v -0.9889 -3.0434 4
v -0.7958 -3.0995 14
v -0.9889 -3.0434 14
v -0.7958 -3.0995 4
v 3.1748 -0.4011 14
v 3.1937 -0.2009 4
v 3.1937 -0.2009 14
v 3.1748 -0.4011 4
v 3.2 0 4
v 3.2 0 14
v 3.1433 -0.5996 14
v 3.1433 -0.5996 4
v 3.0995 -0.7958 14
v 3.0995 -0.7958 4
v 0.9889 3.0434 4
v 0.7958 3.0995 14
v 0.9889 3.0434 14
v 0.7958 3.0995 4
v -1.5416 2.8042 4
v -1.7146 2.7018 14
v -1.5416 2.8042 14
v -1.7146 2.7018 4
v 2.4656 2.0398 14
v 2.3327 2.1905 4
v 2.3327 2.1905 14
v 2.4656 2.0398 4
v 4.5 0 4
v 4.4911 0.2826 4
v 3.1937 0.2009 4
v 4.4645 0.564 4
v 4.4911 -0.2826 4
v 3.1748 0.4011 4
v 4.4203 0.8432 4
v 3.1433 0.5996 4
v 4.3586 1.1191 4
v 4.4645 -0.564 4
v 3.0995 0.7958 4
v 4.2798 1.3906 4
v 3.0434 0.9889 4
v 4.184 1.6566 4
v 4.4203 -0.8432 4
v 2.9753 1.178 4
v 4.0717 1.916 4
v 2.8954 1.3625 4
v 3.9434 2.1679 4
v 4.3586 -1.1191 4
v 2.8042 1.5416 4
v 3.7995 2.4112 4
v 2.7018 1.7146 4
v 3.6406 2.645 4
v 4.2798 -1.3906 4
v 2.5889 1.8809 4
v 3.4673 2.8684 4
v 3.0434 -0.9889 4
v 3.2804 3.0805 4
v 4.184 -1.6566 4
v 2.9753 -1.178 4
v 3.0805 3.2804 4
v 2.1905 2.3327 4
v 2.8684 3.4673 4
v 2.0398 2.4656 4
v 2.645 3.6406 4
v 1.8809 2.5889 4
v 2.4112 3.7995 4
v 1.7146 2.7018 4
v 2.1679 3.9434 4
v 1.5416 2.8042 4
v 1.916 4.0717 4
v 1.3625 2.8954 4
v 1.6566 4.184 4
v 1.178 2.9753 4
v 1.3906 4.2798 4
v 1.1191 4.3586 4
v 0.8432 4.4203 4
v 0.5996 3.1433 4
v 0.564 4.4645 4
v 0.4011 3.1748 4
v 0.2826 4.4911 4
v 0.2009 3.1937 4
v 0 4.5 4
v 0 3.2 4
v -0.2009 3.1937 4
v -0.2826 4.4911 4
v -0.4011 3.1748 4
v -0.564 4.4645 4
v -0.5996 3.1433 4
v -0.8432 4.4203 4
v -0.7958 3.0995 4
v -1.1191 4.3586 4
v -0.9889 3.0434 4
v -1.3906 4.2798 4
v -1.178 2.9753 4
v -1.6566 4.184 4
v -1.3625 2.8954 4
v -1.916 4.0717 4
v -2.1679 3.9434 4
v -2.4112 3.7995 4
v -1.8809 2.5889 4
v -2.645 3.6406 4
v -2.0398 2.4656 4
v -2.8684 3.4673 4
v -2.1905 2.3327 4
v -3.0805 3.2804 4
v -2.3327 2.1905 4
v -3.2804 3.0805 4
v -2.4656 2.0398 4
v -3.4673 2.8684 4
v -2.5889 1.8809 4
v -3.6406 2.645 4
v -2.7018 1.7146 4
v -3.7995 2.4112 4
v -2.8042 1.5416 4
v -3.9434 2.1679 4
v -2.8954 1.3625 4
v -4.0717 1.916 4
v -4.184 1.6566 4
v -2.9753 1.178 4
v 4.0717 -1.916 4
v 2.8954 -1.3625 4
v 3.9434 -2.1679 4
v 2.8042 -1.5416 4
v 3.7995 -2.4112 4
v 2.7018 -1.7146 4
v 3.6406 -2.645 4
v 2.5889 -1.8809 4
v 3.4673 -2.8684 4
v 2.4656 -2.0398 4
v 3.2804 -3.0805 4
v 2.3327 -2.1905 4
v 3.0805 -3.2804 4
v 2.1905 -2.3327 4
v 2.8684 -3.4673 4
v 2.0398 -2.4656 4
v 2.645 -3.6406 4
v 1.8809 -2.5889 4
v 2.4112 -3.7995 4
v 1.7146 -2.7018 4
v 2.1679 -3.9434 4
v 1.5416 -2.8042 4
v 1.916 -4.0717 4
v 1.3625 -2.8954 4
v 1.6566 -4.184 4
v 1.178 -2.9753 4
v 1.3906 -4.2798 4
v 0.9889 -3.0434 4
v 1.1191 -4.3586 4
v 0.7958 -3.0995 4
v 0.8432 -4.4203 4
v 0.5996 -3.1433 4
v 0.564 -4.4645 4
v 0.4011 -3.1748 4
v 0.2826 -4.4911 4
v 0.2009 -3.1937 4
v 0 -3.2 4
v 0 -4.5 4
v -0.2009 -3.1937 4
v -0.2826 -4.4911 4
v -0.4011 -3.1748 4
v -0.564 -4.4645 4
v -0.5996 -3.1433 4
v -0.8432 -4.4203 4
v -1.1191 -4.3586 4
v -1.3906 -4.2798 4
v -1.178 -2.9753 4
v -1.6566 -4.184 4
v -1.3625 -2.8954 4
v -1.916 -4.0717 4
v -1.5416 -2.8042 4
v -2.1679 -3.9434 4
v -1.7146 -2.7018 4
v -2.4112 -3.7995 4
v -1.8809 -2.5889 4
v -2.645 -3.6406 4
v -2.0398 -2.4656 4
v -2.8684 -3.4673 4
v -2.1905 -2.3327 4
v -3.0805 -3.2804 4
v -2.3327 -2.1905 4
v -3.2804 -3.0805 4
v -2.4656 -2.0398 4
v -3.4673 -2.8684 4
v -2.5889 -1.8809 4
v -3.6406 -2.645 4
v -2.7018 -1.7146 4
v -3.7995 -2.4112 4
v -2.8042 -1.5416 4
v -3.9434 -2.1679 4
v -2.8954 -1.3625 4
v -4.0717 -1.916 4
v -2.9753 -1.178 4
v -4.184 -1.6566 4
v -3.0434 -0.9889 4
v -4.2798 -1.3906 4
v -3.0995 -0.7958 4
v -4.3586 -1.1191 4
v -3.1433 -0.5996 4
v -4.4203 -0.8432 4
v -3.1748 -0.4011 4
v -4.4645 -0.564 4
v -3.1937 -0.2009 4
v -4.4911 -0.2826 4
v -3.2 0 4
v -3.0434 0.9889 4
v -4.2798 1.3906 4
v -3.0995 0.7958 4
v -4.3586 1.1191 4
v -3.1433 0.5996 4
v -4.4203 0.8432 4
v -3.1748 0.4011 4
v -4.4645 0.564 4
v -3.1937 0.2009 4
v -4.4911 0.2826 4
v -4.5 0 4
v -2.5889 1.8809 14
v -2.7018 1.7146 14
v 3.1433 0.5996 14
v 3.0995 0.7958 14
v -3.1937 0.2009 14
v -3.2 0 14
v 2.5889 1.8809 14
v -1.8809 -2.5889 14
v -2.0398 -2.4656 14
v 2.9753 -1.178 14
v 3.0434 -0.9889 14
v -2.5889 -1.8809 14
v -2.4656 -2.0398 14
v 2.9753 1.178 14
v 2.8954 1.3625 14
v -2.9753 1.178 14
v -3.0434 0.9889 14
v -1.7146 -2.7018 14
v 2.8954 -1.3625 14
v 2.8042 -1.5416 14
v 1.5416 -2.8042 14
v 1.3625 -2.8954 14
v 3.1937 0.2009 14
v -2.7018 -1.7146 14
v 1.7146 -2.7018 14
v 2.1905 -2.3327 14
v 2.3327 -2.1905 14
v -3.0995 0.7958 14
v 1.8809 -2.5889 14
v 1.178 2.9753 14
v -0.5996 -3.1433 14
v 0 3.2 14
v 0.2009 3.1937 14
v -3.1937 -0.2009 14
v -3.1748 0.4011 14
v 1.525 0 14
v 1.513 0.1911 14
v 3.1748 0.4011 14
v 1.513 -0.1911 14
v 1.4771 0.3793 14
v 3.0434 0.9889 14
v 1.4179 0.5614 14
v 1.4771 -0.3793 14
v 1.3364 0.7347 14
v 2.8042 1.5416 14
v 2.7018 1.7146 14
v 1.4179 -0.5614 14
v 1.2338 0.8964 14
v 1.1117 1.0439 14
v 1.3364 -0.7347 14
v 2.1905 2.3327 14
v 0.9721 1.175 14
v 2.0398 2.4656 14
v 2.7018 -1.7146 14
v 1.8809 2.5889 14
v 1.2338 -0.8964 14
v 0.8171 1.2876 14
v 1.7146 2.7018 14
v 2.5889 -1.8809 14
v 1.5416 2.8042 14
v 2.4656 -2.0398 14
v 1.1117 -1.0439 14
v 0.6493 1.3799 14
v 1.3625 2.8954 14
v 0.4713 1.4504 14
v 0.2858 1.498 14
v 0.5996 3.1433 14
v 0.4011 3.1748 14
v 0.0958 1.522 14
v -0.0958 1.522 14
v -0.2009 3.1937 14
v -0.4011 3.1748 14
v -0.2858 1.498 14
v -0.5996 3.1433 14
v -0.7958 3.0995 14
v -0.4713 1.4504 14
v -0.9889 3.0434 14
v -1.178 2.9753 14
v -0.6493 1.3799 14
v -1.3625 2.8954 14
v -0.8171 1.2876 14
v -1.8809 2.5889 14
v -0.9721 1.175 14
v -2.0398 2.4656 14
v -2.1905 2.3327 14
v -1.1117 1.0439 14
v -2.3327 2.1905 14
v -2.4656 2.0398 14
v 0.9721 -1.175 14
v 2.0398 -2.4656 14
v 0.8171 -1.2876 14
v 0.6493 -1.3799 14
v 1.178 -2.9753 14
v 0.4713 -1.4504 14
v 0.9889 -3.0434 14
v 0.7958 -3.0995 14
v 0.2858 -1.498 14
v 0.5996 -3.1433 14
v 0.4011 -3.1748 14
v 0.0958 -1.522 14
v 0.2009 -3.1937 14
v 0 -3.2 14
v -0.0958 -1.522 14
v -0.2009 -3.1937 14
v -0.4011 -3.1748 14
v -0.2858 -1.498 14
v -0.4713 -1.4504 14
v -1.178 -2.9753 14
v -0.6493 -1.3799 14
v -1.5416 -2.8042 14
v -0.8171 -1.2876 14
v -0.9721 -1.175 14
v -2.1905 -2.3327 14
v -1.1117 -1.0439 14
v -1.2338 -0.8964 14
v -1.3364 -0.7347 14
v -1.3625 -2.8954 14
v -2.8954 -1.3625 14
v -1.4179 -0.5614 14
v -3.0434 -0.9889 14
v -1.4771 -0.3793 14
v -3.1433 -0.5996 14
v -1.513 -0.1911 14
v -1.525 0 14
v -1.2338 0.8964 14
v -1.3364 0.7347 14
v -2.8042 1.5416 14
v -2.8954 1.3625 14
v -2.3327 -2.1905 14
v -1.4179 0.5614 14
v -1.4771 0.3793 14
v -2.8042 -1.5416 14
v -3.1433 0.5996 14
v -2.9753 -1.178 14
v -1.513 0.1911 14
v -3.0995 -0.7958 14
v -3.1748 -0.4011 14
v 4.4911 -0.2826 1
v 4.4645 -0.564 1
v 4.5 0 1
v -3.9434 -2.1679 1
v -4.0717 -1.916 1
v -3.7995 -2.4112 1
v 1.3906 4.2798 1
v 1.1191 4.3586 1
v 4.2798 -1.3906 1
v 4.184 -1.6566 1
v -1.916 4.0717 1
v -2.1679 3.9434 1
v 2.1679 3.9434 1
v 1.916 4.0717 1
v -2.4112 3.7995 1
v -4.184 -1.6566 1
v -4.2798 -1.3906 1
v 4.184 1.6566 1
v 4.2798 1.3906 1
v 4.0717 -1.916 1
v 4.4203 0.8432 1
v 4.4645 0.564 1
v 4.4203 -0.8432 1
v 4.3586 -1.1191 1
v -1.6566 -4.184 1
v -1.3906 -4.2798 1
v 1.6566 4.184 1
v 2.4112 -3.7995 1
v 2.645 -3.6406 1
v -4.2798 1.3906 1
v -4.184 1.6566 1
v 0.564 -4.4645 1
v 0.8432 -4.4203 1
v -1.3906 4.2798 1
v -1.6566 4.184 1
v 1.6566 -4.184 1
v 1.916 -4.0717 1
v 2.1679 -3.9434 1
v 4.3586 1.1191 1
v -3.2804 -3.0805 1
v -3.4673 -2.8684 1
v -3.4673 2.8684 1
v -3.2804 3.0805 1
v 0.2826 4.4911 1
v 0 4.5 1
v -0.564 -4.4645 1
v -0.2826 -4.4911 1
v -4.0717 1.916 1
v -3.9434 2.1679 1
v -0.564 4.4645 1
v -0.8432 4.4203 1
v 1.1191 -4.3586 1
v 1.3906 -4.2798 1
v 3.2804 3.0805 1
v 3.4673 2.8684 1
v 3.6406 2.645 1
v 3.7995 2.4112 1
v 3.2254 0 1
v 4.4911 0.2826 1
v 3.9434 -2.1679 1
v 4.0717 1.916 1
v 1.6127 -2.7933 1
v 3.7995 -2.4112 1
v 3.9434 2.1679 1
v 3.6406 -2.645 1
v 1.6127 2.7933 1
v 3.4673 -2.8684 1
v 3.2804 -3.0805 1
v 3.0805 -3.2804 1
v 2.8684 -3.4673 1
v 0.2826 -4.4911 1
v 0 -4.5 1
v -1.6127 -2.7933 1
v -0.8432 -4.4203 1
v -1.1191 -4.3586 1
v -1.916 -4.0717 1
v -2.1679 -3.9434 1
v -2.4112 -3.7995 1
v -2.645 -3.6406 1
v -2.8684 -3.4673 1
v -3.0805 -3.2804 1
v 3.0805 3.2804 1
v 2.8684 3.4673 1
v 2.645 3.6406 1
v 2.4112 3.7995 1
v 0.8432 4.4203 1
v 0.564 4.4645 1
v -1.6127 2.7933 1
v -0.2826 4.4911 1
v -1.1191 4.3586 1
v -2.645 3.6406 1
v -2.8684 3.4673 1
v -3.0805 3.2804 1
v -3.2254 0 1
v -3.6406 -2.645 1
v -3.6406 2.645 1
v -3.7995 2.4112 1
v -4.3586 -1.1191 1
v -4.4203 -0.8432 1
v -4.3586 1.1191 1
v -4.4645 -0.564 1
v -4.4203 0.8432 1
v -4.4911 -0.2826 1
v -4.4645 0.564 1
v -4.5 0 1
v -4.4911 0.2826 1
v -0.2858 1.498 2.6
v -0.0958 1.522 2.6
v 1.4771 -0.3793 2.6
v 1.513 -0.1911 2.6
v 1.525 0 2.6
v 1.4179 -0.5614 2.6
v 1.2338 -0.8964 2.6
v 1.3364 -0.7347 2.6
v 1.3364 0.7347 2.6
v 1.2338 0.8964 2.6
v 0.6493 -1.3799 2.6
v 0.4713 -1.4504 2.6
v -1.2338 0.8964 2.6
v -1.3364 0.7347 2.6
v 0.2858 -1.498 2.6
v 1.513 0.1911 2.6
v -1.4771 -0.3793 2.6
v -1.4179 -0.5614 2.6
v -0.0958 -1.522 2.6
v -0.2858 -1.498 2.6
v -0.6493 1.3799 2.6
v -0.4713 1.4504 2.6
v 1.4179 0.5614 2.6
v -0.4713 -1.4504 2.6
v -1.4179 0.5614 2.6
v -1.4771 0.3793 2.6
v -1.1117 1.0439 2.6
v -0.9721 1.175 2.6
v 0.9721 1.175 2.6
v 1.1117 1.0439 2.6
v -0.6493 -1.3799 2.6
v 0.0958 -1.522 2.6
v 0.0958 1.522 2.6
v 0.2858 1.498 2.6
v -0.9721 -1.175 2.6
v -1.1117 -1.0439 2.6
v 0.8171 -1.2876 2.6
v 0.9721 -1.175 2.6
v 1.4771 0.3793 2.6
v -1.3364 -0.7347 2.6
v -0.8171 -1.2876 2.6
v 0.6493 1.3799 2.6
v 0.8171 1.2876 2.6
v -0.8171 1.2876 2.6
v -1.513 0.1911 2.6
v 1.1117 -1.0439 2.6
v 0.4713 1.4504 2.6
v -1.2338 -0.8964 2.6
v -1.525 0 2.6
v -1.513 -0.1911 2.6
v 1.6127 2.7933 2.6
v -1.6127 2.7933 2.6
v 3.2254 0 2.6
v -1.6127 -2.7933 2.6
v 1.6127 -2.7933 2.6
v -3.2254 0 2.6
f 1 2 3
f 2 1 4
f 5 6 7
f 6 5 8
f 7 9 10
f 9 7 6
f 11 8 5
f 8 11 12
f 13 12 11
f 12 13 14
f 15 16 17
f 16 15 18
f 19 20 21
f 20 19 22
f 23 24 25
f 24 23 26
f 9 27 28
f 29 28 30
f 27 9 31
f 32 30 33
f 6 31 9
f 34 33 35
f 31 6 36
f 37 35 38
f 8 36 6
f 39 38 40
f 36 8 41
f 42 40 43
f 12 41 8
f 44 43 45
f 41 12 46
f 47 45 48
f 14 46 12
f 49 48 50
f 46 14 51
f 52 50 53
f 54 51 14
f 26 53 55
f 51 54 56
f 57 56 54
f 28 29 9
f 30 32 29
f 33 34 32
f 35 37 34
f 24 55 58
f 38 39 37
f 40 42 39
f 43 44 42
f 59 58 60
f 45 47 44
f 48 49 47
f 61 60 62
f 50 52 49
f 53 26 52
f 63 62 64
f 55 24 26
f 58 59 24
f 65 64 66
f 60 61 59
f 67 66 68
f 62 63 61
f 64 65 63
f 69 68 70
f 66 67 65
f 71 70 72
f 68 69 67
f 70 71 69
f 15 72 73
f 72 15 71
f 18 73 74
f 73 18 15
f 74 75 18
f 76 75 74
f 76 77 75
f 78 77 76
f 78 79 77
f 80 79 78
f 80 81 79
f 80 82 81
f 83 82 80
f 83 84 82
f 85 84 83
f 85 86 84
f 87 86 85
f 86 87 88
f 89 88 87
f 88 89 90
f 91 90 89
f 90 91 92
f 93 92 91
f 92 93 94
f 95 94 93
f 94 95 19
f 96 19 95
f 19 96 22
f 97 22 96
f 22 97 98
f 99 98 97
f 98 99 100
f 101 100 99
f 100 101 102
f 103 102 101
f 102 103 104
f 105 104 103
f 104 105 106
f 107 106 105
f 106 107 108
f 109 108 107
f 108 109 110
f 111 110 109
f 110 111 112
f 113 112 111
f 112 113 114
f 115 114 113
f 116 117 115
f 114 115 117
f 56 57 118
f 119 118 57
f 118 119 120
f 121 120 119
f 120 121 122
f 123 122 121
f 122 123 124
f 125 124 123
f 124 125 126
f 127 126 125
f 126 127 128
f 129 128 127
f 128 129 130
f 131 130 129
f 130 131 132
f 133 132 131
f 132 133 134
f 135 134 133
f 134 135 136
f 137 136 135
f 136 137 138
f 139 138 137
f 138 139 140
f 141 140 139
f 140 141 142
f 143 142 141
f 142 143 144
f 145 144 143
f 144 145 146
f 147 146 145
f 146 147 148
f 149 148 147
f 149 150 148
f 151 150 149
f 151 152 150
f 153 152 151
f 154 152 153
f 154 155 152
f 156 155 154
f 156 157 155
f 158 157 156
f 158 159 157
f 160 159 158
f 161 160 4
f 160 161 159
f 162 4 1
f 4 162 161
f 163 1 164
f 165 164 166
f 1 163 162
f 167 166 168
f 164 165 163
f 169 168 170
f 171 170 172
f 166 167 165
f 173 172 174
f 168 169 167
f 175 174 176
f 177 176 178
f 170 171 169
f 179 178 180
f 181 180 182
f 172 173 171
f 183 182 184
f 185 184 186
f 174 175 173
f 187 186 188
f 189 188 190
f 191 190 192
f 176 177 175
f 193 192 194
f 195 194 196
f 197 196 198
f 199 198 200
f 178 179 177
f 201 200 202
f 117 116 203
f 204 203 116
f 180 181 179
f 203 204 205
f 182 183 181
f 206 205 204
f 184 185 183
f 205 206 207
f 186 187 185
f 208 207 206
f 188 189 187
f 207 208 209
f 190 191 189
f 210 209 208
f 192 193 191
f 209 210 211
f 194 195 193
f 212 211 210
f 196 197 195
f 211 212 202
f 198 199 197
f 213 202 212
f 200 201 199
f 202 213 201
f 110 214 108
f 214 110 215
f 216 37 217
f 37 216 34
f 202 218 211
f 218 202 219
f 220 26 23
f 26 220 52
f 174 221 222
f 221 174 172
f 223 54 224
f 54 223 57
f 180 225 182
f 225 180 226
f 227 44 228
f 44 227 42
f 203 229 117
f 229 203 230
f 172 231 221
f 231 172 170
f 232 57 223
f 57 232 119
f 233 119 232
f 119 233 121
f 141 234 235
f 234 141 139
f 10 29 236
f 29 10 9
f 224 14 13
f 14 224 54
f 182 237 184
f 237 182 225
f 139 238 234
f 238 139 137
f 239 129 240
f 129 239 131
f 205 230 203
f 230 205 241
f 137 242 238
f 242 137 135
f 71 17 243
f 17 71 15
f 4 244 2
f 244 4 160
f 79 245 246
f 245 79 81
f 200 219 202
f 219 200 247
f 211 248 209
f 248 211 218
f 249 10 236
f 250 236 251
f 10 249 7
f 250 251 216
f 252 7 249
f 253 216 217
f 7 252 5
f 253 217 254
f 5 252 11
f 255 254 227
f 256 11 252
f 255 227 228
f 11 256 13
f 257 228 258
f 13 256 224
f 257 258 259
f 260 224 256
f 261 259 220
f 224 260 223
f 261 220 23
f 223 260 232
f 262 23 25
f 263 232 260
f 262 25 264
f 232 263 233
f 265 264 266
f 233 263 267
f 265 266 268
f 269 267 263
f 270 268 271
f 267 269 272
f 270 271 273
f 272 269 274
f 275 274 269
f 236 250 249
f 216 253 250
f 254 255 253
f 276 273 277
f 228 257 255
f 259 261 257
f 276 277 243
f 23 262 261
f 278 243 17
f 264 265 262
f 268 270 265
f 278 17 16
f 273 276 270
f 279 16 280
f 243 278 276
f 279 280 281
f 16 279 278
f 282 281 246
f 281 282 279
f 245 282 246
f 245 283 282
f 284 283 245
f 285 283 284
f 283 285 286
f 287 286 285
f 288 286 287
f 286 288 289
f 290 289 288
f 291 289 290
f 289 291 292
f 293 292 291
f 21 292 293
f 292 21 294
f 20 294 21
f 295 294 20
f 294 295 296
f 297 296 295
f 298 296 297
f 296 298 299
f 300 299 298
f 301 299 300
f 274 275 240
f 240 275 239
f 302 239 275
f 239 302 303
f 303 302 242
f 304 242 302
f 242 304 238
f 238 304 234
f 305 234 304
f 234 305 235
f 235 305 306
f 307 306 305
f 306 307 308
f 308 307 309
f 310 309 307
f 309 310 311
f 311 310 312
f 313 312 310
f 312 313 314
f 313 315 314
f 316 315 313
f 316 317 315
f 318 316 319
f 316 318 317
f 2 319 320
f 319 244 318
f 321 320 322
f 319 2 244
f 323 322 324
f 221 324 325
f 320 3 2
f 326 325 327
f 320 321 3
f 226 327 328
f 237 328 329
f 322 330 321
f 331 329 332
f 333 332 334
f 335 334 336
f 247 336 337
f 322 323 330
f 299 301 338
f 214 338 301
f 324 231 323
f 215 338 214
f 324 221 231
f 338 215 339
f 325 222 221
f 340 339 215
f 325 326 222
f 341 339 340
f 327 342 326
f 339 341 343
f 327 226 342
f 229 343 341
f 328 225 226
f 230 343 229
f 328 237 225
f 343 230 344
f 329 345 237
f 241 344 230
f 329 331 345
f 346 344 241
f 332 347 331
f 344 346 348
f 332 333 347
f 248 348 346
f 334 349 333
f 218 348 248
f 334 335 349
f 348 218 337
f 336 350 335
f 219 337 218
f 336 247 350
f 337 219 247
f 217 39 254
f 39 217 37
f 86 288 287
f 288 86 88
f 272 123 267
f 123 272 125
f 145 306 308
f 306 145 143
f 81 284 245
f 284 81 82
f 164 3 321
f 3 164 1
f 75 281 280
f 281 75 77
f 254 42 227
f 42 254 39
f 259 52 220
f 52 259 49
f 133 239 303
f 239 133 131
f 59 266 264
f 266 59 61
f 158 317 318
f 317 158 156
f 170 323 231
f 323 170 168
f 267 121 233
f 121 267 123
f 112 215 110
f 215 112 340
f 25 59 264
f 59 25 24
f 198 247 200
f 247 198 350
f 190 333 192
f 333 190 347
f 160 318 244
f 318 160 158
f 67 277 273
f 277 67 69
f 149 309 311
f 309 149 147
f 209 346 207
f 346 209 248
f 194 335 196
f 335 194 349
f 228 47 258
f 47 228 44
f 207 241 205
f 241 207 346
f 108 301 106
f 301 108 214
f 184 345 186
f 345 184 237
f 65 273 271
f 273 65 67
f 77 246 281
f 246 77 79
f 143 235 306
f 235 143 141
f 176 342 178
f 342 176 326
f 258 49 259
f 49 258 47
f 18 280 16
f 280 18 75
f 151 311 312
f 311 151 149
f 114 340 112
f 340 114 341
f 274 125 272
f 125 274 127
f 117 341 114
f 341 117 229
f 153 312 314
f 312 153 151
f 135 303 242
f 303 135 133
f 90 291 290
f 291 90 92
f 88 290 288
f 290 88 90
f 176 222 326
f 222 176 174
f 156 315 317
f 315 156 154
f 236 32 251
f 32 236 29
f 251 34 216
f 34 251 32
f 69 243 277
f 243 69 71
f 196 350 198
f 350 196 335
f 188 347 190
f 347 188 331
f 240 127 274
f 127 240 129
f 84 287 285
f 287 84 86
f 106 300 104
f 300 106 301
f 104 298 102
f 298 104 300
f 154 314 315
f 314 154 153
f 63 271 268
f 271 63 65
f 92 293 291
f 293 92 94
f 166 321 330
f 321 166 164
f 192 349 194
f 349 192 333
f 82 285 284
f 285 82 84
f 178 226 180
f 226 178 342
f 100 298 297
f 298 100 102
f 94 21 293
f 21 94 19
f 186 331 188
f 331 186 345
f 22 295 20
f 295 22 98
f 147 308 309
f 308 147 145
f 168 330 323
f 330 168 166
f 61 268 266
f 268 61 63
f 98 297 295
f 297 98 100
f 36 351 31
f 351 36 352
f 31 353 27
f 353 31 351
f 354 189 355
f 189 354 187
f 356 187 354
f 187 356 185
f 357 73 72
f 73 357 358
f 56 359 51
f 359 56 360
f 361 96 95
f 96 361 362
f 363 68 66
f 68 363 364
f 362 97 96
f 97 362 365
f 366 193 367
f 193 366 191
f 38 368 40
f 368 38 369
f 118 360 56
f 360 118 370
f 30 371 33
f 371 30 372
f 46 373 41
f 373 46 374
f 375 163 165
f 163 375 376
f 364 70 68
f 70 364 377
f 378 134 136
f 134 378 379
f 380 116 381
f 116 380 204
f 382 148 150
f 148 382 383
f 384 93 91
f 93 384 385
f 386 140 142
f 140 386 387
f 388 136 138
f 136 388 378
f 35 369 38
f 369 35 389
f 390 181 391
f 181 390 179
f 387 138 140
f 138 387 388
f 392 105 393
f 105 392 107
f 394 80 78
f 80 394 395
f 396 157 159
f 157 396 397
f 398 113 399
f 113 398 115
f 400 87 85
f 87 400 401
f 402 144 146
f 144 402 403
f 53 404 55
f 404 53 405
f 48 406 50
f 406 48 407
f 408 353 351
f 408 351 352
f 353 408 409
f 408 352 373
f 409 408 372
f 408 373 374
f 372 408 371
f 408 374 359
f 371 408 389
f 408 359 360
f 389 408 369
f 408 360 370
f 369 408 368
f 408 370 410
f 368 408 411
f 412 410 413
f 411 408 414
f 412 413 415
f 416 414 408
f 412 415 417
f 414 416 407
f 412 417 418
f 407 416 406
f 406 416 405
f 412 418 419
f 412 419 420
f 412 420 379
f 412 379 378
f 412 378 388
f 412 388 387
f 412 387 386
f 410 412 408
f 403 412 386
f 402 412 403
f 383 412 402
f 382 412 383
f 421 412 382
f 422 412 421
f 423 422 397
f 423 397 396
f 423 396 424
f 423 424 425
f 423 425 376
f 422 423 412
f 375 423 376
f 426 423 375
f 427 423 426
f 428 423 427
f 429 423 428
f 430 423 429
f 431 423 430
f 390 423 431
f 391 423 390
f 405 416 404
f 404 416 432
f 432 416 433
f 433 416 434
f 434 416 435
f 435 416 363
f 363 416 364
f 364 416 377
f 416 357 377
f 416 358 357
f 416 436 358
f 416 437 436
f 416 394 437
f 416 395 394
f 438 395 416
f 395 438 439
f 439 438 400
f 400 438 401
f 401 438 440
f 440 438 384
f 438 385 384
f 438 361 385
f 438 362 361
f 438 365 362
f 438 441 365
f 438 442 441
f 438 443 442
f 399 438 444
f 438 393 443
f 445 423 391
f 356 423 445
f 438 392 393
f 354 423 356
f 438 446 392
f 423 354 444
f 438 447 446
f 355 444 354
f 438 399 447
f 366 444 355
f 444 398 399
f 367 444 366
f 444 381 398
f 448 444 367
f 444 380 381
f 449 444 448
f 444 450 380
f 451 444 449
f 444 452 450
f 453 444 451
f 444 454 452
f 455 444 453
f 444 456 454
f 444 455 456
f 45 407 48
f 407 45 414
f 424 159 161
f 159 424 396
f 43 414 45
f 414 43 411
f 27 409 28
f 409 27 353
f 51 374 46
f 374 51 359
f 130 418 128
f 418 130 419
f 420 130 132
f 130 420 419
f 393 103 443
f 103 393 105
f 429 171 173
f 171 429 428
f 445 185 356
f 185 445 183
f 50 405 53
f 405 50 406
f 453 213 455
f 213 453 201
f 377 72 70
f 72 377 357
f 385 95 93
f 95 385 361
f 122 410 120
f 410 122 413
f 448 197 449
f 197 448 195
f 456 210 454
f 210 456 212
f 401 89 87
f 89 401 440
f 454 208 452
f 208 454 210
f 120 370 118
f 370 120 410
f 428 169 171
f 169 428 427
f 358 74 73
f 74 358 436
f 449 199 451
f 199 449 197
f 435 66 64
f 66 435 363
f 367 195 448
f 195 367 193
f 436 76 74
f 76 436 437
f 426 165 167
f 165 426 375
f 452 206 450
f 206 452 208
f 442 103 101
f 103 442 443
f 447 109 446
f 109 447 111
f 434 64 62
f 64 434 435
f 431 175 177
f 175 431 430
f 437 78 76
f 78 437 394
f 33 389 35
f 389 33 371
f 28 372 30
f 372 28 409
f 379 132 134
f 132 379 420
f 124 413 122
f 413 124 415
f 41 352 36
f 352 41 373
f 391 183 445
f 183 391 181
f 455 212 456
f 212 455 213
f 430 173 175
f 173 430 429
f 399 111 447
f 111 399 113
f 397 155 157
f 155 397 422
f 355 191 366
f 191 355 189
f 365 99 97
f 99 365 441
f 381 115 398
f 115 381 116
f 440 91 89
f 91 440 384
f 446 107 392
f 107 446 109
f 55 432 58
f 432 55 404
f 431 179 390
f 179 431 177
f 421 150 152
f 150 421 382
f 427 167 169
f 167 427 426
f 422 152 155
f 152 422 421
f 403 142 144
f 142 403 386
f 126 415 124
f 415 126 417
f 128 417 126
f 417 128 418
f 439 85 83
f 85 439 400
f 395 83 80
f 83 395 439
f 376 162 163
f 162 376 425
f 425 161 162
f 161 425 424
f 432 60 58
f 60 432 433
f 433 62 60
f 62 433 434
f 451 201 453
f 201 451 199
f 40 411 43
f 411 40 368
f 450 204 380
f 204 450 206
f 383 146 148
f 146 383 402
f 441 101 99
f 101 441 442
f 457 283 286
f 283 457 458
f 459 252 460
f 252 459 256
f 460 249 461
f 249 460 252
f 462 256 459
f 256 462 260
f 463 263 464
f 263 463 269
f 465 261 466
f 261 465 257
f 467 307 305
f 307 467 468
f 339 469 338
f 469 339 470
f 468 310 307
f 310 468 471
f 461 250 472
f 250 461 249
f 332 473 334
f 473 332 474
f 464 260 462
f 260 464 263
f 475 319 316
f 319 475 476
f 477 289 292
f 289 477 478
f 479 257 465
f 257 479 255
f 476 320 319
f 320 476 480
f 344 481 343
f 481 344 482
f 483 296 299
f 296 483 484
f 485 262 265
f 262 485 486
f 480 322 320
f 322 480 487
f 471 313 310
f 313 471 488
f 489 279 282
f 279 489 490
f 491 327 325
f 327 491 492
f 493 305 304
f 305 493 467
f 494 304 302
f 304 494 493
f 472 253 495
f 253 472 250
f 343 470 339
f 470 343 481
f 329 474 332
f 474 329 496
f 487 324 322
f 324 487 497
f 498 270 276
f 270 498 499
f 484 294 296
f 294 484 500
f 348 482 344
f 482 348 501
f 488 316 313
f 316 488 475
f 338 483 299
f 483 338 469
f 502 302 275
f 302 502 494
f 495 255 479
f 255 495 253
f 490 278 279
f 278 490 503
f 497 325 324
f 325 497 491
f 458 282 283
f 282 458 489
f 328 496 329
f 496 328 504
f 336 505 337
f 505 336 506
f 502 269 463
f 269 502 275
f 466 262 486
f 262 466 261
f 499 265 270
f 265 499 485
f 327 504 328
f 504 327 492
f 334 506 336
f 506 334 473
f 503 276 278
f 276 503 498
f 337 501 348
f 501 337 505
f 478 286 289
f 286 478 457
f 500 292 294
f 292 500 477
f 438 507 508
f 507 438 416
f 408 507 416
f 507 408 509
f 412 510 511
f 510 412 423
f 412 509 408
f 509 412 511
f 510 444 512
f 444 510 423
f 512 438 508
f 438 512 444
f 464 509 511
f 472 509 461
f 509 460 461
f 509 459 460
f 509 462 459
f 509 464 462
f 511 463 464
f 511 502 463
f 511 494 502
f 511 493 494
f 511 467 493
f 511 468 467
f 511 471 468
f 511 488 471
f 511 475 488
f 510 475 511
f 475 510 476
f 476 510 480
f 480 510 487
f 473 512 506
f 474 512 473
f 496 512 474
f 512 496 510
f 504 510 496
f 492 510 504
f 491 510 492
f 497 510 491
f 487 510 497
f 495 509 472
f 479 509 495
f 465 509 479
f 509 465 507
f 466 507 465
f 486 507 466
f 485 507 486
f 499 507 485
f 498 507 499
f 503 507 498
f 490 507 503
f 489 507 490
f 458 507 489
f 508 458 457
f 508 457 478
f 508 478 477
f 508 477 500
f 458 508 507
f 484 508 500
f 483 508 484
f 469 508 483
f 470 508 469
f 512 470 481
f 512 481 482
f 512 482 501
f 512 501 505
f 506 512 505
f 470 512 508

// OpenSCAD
/*
Copyright Dr. Mrs. The Mistress 2020.
This documentation describes Open Hardware and is licensed under the CERN OHL v. 1.2.

You may redistribute and modify this documentation under the terms of the
CERN OHL v.1.2. (http://ohwr.org/cernohl). This documentation is distributed
WITHOUT   ANY   EXPRESS   OR   IMPLIED   WARRANTY,   INCLUDING   OF
MERCHANTABILITY,   SATISFACTORY   QUALITY   AND   FITNESS   FOR   A
PARTICULAR   PURPOSE.   Please   see   the   CERN   OHL   v.1.2  for   applicable
conditions.
*/

// This is an adapter that allows you to use a m3 screw in a larger hole with a nut.
translate([0,0,14])
rotate([180,0,0])
difference() {
    
    union() {
        cylinder(d=6.40,h=10, $fn=100 );
        translate([0,0,10])
        cylinder(d=9,h=3, $fn=100 );
    }
    cylinder(d=3.05,h=14, $fn=50 );
    translate([0,0,14-2.6])
    nut_trap();
}

module nut_trap (w = 5.5, h = 2.6){
    cylinder(r = w / 2 / cos(180 / 6) + 0.05, h=h, $fn=6);
}   
